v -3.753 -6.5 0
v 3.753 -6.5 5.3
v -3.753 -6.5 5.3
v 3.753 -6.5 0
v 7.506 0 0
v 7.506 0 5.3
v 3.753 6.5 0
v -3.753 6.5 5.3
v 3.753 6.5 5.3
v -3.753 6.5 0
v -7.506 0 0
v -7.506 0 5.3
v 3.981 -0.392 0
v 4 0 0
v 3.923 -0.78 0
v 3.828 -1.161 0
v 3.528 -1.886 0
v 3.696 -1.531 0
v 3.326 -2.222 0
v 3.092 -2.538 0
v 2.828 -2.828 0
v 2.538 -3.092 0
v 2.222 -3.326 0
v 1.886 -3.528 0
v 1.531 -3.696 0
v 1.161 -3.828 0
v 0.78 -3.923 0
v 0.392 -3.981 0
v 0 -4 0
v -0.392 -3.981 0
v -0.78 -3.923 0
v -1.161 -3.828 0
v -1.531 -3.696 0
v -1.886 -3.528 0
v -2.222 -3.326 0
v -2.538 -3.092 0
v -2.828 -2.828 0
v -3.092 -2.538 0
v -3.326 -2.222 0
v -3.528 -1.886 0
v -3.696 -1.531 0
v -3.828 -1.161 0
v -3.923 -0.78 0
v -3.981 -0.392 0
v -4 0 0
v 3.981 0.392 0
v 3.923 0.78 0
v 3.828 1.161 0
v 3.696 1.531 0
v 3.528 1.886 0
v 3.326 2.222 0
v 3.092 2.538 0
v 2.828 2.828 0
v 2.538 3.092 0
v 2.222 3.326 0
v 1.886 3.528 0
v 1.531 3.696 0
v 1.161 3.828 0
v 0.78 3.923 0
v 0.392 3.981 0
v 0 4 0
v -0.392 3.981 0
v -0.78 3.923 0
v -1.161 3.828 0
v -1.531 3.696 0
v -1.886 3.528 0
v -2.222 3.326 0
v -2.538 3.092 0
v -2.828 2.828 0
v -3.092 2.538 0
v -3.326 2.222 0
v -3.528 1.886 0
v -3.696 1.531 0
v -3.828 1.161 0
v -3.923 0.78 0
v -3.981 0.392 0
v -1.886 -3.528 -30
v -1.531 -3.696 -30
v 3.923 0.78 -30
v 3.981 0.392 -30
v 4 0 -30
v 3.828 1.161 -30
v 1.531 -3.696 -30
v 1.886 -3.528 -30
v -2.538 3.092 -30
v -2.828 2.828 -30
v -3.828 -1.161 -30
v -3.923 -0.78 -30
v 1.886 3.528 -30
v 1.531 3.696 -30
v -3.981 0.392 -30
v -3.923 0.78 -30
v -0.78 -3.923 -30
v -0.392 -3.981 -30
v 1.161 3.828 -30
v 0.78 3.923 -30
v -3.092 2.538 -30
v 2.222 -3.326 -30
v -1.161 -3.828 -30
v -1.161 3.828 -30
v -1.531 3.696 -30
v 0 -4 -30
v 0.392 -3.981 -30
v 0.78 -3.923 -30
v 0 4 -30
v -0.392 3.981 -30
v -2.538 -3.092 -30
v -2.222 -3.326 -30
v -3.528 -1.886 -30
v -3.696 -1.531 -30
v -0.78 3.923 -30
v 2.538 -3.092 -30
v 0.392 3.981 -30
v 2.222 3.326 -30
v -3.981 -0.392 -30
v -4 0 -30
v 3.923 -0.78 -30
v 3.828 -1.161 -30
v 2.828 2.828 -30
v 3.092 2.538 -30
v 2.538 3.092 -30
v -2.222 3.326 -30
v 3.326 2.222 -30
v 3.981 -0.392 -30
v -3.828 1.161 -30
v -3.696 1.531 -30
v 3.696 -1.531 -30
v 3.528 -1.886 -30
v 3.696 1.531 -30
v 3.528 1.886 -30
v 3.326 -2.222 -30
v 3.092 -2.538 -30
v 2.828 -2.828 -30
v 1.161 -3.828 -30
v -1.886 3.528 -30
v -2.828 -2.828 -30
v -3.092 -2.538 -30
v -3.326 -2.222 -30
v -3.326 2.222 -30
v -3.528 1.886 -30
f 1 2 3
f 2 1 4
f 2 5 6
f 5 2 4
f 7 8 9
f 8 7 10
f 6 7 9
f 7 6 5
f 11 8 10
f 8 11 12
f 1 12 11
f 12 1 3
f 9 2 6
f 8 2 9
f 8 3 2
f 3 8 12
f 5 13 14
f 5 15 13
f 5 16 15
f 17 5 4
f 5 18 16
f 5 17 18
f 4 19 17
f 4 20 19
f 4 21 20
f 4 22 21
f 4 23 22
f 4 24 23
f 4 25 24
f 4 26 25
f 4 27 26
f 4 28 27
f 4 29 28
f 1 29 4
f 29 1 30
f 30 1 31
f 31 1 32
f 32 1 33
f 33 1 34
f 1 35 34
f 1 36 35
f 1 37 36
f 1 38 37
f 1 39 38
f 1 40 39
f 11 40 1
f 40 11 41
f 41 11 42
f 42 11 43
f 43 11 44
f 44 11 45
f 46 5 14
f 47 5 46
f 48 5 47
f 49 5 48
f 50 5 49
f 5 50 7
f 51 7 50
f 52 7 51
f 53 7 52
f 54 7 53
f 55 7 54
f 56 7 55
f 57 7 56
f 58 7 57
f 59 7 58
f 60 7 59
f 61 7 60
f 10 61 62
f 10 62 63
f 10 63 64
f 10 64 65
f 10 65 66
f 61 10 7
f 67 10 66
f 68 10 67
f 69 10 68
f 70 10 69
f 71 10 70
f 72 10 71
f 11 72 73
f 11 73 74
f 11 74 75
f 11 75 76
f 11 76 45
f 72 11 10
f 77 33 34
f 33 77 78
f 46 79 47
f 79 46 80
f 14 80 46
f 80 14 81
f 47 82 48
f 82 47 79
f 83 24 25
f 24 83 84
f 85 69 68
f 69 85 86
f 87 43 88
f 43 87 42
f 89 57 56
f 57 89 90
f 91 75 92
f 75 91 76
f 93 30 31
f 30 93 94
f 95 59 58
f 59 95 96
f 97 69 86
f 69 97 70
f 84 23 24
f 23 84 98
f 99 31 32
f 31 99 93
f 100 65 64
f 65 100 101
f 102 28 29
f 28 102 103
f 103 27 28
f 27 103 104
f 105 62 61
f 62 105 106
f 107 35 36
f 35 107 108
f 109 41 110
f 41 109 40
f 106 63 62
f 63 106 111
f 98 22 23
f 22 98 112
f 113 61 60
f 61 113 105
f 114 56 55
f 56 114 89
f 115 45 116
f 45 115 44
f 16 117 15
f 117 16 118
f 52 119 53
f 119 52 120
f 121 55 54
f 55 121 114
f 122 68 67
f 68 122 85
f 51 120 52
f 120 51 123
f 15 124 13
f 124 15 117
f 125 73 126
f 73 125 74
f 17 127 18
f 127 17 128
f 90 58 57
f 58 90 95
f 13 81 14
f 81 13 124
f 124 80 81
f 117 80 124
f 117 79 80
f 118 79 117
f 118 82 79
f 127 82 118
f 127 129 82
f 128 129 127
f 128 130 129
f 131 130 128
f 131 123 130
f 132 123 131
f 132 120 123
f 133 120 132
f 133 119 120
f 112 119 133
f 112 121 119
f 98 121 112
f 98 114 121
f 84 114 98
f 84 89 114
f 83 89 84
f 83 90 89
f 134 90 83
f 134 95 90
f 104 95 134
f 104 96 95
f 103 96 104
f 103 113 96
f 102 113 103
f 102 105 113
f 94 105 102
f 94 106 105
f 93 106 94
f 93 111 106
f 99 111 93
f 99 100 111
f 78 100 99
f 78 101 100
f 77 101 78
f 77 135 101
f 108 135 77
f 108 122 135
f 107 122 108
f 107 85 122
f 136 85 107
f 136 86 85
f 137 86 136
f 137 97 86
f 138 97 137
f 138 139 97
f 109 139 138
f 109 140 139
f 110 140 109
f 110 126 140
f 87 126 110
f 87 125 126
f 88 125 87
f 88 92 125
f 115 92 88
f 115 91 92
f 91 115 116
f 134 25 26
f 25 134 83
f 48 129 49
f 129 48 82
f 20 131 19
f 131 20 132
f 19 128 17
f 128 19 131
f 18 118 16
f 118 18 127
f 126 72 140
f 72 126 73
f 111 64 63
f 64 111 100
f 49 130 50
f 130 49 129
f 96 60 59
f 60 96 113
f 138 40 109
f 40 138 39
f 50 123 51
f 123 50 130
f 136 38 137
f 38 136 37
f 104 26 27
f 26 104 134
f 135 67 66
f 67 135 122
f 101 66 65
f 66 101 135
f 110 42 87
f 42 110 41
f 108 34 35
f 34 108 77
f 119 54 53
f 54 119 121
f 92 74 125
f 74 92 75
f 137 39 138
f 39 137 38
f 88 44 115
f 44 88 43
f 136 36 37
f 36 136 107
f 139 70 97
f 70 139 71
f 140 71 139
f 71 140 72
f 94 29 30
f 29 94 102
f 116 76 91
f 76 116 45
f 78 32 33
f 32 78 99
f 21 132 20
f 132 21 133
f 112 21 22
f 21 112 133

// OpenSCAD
// M8 六角ボルト（ねじ山省略）
union() {
    // 頭部：対辺距離 13 mm、高さ 5.3 mm
    cylinder(h = 5.3, d = 26 / sqrt(3), $fn = 6);

    // シャンク：直径 8 mm、長さ 30 mm
    translate([0, 0, -30])
        cylinder(h = 30, d = 8, $fn = 64);
}
